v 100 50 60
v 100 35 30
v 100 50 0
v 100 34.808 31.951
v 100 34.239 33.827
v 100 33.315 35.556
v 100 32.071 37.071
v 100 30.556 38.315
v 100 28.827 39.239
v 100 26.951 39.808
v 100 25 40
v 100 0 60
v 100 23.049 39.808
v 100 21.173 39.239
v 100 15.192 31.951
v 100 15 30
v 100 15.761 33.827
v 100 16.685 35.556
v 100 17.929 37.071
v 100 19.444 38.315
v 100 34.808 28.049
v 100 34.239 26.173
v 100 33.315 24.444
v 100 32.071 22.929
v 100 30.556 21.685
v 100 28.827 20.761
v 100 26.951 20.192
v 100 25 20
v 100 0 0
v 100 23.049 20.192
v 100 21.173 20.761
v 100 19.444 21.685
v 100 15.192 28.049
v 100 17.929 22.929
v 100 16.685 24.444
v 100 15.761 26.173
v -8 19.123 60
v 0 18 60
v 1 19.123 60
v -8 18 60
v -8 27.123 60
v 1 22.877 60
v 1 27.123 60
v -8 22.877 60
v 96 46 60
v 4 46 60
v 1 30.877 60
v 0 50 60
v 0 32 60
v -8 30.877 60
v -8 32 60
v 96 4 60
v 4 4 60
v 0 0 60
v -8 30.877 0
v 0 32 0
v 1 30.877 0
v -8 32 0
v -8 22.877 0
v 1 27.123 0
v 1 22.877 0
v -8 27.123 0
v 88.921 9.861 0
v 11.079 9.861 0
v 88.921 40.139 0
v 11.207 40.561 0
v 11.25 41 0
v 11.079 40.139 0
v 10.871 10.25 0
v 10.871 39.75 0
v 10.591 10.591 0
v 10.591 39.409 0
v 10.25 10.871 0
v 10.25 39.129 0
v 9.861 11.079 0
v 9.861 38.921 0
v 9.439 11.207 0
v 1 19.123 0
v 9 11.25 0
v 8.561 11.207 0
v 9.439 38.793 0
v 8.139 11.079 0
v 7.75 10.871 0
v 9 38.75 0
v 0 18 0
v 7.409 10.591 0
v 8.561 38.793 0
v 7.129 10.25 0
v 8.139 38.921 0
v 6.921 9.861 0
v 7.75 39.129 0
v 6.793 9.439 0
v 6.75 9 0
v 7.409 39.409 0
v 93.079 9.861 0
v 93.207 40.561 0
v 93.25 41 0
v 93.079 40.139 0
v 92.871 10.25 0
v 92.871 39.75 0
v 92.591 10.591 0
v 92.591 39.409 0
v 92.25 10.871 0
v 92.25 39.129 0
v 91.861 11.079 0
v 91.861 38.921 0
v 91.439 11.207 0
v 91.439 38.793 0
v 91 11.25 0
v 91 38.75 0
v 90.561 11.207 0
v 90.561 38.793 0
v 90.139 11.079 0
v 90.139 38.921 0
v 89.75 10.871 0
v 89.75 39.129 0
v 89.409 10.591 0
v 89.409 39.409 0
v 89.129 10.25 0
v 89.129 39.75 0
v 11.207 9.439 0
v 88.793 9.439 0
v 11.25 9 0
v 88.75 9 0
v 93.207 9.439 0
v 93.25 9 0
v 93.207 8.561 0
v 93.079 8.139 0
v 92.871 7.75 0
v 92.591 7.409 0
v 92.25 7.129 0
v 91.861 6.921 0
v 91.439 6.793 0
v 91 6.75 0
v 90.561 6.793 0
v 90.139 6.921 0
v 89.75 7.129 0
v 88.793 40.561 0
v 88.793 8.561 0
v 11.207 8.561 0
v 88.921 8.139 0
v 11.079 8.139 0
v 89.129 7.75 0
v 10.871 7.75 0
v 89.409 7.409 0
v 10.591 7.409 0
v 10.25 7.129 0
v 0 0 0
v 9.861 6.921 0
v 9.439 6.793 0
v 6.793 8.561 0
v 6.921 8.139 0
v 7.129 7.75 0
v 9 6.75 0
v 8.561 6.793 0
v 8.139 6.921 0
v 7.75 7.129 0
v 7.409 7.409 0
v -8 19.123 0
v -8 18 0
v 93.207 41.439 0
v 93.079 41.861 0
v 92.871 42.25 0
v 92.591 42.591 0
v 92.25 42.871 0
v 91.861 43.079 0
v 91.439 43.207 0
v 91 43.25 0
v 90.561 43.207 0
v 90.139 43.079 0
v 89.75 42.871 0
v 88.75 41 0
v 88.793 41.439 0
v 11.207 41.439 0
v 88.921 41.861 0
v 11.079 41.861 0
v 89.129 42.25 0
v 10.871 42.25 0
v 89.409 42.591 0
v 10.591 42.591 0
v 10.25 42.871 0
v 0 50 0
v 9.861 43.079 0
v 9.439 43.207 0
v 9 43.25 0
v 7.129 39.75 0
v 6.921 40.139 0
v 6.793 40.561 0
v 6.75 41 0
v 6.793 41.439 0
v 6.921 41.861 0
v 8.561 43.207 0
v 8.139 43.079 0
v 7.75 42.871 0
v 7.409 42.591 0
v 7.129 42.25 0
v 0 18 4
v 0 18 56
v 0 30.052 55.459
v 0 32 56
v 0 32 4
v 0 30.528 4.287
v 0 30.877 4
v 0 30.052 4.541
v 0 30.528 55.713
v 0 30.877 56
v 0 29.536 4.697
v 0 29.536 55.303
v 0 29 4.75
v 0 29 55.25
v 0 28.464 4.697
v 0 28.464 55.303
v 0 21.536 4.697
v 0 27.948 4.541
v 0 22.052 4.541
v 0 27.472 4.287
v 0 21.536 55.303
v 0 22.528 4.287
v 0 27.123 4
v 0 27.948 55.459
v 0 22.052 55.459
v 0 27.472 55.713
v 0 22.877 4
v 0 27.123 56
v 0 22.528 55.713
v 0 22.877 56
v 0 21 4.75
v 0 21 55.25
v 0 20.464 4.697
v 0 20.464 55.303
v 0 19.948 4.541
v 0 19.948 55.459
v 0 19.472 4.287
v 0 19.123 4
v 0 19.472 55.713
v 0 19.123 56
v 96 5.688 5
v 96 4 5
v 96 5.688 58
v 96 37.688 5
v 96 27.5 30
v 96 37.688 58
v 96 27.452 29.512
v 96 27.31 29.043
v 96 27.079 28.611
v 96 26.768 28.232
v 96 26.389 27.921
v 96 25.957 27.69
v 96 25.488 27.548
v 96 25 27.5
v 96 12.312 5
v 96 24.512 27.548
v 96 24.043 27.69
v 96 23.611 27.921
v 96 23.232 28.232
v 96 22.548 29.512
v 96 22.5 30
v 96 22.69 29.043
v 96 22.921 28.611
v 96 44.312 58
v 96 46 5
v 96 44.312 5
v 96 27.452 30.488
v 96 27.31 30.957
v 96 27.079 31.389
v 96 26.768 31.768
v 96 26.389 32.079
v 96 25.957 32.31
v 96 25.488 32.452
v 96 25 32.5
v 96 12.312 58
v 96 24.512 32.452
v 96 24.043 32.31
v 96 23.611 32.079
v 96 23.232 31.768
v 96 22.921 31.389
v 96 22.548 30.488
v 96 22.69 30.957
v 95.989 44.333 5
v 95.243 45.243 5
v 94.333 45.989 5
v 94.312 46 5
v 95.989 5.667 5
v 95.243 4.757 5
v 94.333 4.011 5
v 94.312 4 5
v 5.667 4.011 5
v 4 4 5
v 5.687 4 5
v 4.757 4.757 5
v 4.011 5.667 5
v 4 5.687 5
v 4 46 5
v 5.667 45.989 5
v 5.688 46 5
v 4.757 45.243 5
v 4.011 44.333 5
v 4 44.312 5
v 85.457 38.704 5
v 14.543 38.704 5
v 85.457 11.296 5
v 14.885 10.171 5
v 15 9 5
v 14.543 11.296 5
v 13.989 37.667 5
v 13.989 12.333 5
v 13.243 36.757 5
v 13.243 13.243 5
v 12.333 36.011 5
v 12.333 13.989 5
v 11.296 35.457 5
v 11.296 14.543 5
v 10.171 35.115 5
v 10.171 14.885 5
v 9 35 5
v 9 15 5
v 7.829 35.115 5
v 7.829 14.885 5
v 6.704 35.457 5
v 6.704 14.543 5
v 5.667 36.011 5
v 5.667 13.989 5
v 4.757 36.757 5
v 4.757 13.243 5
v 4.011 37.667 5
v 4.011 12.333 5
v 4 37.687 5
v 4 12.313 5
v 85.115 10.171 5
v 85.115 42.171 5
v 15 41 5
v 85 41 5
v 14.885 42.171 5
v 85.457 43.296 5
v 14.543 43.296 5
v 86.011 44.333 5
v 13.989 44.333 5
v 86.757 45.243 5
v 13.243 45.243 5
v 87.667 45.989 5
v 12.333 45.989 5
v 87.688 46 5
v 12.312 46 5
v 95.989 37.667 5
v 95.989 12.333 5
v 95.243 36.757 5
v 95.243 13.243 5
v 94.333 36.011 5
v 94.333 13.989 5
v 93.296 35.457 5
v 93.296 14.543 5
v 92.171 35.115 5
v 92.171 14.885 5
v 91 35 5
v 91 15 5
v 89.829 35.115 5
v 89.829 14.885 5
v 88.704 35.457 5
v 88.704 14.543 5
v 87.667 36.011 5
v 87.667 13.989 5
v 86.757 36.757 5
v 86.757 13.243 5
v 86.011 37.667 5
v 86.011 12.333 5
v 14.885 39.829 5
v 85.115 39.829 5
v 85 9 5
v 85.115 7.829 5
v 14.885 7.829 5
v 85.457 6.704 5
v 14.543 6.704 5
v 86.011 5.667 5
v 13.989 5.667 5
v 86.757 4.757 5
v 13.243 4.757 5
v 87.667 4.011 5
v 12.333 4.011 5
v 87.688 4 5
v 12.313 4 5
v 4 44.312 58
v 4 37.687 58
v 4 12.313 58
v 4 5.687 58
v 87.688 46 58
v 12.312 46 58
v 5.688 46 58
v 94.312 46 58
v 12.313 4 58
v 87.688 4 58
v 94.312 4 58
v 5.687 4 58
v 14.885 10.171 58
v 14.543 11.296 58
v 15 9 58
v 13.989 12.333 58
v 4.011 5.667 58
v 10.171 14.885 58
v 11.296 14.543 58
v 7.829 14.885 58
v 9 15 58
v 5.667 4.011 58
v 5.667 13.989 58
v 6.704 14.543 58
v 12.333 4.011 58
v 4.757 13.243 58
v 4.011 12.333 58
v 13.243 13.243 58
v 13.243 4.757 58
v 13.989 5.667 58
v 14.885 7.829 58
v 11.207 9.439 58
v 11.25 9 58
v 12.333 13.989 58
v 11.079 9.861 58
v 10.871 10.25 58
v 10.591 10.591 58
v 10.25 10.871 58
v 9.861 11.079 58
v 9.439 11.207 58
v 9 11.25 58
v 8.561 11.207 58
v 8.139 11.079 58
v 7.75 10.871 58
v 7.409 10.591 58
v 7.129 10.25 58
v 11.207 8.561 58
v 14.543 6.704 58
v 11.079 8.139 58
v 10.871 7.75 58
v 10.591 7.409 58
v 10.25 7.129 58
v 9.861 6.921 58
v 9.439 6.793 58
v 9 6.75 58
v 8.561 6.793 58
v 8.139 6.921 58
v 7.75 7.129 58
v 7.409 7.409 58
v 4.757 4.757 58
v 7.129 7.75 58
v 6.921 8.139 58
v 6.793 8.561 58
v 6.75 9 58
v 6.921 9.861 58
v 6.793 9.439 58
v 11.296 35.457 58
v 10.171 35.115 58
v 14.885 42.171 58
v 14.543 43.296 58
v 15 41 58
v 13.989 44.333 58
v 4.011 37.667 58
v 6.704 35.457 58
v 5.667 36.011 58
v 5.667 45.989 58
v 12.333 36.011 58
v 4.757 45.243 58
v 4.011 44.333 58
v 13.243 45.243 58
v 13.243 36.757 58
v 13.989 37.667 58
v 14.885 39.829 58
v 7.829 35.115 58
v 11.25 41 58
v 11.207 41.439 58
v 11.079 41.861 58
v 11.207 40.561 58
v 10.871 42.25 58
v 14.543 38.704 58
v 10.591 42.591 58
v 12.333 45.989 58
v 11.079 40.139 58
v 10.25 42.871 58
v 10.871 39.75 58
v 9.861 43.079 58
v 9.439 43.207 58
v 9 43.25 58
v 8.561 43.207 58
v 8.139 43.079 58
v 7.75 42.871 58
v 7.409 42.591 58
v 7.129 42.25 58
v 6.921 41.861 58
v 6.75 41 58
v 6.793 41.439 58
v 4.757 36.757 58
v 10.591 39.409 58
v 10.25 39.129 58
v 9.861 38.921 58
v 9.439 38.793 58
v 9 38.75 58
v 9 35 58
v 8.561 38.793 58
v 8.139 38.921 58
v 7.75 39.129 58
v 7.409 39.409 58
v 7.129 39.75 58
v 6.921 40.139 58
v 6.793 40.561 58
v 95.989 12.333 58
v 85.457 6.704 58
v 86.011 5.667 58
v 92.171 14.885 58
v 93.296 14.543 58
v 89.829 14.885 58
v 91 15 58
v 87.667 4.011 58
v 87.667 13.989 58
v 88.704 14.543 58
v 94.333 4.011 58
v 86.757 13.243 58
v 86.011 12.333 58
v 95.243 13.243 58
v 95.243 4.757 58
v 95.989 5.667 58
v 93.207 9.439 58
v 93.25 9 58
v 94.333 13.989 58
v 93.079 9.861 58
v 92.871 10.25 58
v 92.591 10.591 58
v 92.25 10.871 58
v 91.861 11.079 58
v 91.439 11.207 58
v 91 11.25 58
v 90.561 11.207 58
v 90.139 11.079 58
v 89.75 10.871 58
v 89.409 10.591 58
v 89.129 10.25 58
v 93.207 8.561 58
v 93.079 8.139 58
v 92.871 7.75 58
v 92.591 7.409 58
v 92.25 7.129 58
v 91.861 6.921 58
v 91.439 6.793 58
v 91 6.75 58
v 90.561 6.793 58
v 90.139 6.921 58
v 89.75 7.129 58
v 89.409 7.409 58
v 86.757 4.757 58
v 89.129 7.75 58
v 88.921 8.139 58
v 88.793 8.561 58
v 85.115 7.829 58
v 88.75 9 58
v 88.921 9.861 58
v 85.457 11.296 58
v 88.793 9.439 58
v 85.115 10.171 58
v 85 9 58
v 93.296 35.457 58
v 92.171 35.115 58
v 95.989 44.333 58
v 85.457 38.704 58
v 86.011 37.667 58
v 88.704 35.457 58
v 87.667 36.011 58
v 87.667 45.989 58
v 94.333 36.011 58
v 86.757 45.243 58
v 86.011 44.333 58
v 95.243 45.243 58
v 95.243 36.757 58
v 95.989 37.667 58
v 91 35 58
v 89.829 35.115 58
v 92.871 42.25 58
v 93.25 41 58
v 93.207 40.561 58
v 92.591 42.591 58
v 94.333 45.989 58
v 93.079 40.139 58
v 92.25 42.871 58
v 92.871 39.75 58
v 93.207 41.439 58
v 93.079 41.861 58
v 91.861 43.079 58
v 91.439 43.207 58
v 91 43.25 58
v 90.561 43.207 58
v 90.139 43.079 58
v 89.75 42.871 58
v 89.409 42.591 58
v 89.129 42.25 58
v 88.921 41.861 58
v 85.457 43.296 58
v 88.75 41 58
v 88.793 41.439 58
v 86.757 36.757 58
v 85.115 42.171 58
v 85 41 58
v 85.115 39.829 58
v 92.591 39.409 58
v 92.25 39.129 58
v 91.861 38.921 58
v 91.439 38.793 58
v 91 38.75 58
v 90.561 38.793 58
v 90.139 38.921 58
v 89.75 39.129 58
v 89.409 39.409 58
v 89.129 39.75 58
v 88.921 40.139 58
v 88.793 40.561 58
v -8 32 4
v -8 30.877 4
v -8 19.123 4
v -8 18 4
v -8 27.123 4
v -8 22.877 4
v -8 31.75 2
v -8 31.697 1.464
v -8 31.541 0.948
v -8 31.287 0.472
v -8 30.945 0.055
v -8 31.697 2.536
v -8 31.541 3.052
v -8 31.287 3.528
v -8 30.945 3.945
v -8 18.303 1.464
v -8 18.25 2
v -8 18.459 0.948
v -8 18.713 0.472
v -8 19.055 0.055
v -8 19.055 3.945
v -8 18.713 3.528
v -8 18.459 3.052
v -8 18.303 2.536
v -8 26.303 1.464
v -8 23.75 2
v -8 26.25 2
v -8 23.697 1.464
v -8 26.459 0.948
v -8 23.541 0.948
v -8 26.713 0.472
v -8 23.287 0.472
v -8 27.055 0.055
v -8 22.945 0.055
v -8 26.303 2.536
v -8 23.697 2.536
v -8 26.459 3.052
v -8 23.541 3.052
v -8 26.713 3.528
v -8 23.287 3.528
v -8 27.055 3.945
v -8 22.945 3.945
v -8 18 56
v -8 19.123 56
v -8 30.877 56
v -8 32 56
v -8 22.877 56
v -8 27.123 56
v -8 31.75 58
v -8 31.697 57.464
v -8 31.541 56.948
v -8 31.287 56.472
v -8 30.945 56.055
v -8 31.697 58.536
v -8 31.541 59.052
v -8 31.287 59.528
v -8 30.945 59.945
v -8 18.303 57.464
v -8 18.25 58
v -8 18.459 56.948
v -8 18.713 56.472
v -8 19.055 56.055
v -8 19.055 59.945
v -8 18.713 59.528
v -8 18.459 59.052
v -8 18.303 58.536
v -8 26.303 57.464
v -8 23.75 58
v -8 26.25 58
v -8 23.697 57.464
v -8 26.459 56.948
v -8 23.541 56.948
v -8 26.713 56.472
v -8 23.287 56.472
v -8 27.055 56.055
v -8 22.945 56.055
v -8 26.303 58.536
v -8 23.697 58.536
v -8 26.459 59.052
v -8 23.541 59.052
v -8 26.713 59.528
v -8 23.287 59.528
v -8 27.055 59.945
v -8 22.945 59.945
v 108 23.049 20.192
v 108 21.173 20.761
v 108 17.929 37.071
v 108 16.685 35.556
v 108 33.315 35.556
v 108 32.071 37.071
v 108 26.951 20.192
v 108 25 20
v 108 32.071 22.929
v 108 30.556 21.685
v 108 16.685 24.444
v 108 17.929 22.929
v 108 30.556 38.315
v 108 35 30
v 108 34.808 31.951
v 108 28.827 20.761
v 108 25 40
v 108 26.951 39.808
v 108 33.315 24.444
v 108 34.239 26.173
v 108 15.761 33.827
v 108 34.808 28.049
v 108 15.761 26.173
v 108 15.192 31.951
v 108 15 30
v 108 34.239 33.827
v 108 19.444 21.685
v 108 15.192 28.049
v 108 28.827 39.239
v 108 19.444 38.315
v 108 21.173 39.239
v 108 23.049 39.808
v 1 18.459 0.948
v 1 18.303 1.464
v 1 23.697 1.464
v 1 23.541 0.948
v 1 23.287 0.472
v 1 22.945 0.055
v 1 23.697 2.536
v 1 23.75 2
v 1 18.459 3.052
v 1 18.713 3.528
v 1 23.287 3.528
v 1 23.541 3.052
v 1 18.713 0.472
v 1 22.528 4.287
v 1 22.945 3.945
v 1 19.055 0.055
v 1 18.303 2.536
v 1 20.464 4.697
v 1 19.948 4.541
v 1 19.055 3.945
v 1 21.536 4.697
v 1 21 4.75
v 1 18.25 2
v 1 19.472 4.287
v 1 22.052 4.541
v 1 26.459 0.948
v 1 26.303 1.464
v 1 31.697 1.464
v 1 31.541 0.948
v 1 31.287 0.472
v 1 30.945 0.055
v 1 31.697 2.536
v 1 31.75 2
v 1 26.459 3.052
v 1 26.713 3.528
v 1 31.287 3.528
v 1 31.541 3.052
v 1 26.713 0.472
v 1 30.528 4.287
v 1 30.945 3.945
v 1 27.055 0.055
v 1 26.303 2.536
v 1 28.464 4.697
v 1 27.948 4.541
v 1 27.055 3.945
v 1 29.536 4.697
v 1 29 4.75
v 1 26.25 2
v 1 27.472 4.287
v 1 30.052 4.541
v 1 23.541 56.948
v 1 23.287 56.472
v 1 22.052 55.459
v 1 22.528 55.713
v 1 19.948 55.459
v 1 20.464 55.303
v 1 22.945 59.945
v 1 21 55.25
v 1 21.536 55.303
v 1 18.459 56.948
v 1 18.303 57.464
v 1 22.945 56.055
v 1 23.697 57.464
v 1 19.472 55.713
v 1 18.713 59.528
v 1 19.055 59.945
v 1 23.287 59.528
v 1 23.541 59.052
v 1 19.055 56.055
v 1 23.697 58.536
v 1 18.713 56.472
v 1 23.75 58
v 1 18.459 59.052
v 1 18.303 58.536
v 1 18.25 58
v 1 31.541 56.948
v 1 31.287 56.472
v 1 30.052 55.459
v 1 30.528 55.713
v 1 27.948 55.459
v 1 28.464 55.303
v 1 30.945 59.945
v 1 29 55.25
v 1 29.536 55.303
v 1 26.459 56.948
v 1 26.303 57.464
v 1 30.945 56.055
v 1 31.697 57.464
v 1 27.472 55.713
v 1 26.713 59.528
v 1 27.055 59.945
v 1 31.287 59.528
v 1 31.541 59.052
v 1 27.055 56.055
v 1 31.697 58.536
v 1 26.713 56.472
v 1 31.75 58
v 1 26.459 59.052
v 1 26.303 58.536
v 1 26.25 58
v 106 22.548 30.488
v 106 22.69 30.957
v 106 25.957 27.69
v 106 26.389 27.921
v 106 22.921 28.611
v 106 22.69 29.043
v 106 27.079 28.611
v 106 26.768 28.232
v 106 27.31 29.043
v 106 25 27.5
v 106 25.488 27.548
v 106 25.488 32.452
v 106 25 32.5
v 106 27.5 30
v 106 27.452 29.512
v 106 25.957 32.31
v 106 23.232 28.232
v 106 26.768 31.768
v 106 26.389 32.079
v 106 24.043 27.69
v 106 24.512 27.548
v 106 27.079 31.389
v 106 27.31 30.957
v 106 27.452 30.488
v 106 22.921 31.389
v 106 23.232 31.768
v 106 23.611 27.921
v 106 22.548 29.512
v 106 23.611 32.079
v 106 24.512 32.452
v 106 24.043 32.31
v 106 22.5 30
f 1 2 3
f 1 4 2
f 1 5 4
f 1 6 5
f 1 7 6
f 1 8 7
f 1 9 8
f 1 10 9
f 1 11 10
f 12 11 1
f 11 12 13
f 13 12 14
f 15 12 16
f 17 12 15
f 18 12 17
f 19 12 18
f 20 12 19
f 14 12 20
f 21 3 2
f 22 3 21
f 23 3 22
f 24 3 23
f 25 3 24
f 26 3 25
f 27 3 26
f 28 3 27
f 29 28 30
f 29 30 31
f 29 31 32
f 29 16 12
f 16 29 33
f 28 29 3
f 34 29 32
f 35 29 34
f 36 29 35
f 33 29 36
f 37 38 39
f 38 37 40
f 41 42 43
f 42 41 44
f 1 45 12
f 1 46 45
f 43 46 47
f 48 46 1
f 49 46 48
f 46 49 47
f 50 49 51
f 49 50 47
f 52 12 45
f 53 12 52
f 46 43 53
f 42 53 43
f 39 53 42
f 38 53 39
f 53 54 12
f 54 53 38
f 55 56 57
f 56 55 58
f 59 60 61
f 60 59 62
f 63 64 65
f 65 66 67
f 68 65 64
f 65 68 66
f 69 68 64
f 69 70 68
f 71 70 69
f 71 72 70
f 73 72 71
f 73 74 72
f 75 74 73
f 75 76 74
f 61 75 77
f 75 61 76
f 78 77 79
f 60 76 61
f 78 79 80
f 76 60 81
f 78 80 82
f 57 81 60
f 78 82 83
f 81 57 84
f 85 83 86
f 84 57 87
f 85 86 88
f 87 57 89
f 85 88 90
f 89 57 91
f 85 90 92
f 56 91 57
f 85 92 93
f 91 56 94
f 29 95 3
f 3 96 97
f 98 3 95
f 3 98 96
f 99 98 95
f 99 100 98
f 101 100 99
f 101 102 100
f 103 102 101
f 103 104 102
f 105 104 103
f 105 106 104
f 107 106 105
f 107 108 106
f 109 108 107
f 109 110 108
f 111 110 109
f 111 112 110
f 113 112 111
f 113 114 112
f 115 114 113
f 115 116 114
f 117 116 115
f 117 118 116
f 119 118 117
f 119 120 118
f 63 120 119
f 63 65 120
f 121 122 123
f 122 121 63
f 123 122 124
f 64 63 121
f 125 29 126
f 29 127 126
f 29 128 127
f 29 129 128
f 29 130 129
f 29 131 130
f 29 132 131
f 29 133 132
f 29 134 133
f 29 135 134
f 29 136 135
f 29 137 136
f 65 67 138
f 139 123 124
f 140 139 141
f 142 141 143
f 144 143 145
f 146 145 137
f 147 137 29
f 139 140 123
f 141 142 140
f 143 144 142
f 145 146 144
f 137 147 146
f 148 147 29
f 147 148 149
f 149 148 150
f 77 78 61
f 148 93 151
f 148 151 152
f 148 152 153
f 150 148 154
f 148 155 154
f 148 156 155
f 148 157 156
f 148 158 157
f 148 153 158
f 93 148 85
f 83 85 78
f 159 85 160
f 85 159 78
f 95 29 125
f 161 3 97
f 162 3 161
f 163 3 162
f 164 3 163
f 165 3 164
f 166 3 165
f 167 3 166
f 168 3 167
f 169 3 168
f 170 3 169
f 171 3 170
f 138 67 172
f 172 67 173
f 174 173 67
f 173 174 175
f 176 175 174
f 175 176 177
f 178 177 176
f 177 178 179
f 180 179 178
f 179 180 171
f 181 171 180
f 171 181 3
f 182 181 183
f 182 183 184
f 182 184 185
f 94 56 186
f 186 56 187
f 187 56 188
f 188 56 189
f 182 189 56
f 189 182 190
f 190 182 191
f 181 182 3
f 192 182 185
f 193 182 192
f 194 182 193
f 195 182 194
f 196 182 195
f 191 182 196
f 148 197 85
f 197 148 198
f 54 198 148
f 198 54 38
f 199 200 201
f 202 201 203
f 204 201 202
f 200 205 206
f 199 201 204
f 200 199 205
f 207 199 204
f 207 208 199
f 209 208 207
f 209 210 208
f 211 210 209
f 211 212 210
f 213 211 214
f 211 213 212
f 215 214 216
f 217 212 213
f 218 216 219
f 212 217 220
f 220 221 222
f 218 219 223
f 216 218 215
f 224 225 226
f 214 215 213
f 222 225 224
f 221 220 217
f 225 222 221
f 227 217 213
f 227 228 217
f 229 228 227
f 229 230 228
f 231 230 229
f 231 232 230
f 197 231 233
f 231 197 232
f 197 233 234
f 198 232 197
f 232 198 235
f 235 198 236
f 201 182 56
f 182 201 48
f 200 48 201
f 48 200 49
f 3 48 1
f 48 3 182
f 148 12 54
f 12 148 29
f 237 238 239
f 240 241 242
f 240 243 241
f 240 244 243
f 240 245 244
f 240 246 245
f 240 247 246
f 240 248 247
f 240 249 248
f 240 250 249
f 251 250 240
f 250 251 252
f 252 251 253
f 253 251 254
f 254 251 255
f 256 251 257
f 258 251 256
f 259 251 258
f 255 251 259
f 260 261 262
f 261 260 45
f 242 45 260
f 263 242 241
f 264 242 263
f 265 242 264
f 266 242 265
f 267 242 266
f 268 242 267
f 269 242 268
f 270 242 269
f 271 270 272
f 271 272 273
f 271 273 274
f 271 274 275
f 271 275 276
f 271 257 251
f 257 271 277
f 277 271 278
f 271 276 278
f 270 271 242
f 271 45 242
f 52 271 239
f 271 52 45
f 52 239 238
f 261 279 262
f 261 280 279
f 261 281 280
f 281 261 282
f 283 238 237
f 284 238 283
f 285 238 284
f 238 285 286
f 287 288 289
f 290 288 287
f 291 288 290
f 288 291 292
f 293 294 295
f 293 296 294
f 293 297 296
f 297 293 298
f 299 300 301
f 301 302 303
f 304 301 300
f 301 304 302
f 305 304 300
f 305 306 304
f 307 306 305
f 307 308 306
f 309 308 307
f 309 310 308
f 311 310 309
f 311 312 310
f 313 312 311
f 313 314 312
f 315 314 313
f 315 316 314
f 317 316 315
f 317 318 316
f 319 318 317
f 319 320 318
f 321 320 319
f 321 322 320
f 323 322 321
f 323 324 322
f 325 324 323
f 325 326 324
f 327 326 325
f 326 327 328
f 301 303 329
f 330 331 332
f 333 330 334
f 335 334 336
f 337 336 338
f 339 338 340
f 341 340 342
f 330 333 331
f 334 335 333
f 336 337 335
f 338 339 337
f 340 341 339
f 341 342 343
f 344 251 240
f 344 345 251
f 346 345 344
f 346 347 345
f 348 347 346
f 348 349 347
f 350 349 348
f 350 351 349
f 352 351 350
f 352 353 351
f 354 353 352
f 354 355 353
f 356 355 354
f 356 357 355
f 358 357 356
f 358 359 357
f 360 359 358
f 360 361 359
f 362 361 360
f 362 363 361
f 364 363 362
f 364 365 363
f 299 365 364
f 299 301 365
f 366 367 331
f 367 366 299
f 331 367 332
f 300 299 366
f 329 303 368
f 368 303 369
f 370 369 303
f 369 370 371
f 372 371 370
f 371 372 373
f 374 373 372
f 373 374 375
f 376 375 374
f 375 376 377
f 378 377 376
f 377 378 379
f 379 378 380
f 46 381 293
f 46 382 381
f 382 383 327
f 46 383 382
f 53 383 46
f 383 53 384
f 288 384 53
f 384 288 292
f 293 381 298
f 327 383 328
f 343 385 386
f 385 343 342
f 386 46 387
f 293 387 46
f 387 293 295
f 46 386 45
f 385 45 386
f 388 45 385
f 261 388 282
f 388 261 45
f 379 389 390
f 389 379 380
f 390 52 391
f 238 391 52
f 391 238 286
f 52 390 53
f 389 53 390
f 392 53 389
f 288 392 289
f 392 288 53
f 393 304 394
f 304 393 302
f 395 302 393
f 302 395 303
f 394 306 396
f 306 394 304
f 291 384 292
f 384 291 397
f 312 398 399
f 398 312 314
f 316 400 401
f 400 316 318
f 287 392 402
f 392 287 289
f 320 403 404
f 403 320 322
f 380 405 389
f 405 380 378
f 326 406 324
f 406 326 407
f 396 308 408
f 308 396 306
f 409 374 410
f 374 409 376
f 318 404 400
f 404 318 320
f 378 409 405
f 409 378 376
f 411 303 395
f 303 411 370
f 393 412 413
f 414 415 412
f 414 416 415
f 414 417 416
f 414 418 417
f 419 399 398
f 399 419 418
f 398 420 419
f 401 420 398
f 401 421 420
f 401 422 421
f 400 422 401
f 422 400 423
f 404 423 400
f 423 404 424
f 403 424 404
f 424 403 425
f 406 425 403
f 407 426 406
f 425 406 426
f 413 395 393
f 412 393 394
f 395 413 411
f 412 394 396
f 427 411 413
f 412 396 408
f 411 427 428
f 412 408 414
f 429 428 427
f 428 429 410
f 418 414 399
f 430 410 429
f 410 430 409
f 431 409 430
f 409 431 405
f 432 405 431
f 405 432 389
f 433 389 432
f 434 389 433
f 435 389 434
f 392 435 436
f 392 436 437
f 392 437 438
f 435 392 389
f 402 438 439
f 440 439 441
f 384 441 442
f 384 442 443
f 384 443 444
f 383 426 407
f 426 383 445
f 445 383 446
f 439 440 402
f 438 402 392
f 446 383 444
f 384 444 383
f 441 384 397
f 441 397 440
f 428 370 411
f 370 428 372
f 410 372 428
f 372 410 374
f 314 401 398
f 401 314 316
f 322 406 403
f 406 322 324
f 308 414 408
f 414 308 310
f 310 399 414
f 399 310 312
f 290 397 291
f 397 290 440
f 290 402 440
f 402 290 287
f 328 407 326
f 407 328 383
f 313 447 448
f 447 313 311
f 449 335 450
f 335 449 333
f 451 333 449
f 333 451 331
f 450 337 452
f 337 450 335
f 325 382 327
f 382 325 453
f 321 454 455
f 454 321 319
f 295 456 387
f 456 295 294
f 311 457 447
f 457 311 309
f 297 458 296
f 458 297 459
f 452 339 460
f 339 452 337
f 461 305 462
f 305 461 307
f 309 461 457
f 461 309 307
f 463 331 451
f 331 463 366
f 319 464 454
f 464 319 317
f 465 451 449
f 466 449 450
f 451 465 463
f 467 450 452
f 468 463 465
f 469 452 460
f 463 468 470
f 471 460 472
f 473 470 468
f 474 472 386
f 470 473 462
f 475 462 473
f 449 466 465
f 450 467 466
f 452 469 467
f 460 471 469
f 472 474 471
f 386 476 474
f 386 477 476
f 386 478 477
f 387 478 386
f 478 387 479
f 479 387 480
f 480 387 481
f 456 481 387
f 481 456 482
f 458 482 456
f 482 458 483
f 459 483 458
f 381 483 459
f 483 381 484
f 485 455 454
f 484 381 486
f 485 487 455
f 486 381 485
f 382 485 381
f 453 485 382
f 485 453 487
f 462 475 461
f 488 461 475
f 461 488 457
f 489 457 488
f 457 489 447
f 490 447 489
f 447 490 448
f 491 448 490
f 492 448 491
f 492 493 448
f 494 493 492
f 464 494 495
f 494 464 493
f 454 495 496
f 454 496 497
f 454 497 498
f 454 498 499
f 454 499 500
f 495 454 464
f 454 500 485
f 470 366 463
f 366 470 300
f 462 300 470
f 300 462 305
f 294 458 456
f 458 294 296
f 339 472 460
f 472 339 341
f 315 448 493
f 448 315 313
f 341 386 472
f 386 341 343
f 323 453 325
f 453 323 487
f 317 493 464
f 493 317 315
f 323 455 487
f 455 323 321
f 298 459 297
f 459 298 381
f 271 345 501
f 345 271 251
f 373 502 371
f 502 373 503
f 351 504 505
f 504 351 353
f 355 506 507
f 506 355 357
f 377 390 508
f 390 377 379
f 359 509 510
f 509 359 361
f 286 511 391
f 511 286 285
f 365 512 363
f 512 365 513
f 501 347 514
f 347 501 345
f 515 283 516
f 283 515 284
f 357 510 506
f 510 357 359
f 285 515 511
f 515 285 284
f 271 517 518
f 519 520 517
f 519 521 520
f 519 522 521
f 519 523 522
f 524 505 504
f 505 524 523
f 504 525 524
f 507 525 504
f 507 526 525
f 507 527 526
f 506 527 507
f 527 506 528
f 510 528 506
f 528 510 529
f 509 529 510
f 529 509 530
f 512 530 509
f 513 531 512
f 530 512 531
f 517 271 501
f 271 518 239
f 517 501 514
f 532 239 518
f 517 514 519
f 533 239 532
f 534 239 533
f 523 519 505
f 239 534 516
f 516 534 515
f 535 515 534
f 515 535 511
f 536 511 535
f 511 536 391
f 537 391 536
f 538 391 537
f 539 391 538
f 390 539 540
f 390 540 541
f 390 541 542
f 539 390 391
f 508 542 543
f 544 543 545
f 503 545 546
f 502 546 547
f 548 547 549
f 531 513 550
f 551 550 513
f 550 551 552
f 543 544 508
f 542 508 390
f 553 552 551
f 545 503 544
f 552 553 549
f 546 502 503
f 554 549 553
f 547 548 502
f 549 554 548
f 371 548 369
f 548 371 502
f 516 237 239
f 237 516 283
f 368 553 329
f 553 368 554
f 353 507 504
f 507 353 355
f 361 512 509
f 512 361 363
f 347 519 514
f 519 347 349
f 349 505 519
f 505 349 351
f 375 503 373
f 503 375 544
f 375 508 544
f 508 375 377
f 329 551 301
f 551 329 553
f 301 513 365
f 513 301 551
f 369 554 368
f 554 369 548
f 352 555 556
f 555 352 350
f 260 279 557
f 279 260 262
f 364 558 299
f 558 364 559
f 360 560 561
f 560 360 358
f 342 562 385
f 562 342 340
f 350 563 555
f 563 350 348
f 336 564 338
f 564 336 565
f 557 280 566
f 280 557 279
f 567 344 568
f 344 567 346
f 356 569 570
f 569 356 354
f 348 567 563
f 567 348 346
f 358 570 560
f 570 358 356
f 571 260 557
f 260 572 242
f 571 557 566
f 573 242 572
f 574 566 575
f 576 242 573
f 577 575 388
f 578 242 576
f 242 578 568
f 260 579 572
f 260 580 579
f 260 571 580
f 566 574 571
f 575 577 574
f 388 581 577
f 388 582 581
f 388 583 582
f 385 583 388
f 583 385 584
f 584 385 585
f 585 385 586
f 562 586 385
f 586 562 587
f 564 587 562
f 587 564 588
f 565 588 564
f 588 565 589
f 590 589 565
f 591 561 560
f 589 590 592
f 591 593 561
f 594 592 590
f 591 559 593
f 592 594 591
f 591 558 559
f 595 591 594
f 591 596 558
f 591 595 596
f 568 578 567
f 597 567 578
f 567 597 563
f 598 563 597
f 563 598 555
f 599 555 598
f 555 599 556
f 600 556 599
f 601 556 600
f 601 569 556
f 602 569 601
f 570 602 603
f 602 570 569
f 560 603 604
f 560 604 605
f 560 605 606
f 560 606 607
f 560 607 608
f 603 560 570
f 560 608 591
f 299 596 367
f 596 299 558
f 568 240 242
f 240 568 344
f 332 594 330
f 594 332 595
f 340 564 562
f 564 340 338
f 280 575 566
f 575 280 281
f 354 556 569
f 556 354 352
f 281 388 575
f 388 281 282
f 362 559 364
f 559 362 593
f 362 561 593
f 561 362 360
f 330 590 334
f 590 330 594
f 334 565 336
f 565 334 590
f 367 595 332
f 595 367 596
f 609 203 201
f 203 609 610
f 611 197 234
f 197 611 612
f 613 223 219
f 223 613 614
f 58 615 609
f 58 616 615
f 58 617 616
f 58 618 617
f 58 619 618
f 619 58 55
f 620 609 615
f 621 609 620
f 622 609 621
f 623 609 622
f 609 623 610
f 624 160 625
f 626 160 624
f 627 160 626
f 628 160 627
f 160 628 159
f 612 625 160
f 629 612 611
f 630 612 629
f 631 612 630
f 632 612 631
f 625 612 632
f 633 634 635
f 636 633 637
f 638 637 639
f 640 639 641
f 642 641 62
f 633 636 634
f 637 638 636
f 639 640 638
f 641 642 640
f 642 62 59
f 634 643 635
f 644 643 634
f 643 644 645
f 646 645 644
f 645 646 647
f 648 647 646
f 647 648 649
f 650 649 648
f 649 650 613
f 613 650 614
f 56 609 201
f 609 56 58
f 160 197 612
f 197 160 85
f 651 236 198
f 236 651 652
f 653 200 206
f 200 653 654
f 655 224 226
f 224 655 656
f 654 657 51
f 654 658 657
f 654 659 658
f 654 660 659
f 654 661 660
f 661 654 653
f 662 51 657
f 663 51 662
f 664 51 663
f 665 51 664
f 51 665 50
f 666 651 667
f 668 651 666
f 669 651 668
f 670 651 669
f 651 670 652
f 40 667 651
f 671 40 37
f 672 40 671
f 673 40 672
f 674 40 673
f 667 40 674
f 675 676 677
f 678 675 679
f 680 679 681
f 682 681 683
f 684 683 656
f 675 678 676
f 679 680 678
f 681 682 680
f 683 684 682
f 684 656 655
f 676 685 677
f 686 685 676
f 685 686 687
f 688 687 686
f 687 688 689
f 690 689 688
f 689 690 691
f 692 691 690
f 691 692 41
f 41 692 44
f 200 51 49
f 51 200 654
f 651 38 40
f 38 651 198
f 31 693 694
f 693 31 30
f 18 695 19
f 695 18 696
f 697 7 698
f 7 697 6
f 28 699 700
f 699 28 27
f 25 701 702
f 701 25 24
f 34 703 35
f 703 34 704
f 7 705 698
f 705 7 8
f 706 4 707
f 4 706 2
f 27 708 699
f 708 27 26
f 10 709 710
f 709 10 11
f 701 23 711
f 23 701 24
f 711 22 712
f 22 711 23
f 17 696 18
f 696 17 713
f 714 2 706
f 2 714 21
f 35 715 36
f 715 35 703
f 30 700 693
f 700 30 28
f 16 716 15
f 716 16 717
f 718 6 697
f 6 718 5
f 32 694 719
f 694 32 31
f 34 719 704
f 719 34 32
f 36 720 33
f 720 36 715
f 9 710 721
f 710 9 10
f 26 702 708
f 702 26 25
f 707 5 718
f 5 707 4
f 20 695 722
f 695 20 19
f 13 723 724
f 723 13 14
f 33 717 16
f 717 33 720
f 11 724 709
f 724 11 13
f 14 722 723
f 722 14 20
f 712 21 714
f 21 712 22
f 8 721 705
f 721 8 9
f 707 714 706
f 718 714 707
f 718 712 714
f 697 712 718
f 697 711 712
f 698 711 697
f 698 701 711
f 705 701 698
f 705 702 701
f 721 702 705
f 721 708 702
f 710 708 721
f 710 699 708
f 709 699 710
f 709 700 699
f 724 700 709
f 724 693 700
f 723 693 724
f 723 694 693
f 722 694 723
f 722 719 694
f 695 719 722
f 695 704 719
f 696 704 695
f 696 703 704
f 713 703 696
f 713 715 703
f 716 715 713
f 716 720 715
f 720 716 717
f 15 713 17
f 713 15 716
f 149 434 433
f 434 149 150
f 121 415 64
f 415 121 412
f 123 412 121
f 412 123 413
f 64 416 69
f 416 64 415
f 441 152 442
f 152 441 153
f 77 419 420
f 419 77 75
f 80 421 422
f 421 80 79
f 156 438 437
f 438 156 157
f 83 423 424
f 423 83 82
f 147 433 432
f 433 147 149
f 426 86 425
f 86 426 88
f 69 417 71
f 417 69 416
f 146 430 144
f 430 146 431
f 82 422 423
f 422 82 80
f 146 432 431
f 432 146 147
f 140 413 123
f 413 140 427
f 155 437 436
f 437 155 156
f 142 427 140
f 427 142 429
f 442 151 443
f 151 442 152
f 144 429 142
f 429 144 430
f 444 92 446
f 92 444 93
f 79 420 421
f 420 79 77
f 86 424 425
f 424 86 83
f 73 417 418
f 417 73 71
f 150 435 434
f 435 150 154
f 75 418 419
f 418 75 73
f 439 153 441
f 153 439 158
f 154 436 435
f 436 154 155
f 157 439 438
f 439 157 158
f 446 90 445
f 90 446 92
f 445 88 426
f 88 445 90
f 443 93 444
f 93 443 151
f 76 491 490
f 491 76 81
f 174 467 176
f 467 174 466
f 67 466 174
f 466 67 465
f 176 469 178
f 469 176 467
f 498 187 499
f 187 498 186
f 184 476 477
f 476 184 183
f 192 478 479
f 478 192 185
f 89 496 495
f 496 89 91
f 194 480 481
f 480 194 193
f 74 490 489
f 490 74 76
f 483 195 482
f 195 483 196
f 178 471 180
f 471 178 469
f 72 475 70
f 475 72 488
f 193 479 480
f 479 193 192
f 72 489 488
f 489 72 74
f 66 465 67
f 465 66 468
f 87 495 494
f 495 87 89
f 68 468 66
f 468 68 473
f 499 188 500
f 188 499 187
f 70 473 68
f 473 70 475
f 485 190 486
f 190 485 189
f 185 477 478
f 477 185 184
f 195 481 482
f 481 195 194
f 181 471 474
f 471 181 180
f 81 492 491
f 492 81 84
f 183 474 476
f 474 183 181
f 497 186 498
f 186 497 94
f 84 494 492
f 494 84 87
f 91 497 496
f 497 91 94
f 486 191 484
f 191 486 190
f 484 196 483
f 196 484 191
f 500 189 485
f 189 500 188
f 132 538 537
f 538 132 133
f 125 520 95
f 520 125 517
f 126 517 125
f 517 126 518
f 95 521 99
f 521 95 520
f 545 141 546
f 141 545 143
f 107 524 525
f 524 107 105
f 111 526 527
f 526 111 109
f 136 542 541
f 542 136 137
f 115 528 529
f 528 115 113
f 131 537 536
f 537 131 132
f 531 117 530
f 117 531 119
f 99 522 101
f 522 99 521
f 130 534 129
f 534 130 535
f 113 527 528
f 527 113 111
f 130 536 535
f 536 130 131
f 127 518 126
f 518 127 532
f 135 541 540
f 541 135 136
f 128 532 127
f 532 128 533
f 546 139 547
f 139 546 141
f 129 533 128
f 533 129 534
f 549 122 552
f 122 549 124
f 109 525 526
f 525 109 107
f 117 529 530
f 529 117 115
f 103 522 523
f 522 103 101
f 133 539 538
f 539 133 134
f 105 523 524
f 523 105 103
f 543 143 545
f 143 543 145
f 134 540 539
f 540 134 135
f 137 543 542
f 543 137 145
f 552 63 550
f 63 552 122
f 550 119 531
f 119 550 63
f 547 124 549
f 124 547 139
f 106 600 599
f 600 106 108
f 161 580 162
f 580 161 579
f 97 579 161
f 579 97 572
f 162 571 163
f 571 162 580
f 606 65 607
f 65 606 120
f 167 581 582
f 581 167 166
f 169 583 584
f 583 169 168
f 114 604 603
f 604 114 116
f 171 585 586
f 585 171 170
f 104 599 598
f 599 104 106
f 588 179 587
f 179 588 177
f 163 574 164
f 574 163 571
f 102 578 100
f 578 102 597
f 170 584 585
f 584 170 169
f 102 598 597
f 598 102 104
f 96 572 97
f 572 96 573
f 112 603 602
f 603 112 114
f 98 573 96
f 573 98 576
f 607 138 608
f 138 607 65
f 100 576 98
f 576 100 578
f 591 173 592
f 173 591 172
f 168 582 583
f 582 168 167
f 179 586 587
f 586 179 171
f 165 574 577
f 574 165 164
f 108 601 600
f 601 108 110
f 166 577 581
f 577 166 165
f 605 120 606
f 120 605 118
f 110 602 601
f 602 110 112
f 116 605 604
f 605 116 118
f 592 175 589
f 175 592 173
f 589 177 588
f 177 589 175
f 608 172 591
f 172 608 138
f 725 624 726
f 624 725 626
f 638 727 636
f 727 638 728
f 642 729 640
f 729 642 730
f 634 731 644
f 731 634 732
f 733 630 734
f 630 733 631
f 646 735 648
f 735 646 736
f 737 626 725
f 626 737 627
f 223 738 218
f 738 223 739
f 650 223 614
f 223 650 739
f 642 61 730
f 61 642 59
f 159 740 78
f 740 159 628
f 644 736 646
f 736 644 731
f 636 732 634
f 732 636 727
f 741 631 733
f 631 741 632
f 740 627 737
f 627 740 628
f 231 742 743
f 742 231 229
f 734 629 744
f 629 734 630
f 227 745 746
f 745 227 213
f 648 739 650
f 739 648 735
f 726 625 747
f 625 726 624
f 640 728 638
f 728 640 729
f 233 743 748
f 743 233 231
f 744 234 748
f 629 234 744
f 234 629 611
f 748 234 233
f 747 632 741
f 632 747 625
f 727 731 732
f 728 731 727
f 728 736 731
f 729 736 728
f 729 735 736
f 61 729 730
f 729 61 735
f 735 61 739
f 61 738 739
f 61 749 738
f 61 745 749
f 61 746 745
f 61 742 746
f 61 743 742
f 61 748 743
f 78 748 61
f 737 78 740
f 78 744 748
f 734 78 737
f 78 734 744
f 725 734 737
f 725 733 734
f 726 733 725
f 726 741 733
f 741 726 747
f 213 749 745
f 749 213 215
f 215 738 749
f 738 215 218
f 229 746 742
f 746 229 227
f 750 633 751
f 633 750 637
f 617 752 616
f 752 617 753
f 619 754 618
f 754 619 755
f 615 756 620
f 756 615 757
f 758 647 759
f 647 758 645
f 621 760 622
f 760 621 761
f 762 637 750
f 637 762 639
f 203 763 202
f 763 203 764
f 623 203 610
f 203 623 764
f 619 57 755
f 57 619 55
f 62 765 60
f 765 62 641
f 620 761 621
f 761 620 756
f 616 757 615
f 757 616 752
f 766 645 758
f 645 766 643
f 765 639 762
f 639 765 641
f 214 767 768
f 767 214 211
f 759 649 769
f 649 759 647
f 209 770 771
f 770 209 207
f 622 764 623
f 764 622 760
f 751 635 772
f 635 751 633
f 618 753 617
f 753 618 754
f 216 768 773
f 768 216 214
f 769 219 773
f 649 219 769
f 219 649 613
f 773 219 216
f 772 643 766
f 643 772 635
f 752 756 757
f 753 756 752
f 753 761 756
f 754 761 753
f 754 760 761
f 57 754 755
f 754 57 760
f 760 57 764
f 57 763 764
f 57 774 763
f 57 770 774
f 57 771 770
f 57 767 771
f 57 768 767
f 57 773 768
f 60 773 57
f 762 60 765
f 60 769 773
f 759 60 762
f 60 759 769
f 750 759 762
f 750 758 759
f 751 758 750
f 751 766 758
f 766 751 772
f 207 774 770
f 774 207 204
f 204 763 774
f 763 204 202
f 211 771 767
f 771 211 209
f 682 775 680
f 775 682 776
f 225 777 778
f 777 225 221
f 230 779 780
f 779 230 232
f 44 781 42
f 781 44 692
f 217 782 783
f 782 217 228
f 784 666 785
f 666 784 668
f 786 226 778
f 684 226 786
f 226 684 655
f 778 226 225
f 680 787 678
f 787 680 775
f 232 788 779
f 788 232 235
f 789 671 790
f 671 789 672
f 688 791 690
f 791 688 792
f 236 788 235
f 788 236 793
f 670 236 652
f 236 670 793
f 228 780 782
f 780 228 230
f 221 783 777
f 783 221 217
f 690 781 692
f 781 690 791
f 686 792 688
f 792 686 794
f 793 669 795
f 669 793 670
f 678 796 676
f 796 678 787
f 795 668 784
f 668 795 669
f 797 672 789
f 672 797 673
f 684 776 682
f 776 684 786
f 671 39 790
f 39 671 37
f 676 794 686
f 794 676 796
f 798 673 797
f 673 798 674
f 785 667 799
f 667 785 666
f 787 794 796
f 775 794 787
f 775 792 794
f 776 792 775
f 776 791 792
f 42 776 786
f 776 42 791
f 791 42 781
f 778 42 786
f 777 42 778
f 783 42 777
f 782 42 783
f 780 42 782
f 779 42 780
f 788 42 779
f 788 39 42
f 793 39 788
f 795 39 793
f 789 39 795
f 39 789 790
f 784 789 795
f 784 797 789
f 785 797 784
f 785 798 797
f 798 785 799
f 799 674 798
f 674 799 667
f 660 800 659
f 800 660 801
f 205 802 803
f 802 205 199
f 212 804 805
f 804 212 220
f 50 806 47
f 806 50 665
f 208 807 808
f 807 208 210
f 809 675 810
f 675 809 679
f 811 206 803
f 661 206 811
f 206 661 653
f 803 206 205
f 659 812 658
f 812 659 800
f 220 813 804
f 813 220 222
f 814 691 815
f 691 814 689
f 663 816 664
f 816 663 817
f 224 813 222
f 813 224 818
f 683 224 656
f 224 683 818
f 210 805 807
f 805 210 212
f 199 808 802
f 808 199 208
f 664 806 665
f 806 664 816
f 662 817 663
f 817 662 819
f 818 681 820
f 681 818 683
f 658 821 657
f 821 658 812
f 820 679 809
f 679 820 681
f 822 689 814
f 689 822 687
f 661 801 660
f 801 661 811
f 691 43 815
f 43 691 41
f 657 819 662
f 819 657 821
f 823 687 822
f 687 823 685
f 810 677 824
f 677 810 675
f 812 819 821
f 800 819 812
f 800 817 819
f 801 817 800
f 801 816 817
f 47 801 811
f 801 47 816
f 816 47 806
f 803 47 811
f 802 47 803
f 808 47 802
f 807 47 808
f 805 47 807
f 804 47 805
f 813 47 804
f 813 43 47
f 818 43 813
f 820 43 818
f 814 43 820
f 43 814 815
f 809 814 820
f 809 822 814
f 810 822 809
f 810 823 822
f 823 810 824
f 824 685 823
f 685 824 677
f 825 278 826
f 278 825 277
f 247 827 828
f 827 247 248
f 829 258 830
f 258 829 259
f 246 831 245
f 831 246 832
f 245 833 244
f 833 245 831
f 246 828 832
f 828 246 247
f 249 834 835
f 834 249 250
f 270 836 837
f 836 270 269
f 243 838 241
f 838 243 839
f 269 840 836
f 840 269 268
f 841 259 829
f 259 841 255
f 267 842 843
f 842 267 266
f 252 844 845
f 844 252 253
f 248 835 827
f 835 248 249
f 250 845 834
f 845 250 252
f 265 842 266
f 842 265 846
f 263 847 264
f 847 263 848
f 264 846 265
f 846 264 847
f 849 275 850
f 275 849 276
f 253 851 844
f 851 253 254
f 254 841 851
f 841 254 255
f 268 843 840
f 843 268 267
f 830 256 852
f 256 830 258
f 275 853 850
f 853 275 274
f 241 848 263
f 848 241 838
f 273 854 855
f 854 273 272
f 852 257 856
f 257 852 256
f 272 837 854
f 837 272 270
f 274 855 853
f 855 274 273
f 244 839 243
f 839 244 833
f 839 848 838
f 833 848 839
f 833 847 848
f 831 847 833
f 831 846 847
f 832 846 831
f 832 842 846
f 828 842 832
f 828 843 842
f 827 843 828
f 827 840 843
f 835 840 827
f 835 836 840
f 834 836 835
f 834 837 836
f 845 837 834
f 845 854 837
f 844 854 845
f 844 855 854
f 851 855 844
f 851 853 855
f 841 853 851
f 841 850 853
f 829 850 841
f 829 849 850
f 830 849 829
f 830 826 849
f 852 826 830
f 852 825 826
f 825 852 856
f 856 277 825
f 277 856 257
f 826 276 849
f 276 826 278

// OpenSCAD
$fn = 32;

// ----------------------------------------------------------------------
// Enclosure body: 100 x 50 x 60 mm, wall 4 mm
// ----------------------------------------------------------------------

// --- parameters (mm) ---
length = 100;             // outside length, X
width = 50;               // outside width, Y
height = 60;              // outside height, Z
wall = 4;                 // side wall thickness
floor_t = 5;              // floor thickness
boss_d = 12;              // corner boss diameter
boss_h = 53;              // corner boss height above the floor
boss_hole_d = 4.5;        // lid screw clearance in the boss
boss_lip = 9;             // boss centre inset from the corner
ear_w = 14;               // mounting ear width
ear_t = 4;                // mounting ear thickness
ear_ext = 8;              // mounting ear reach
ear_hole_d = 5.5;         // mounting ear drills
nipple_d = 20;            // cable gland boss diameter
nipple_h = 8;             // cable gland boss height
nipple_bore = 5;          // cable gland bore

module shell() {
  difference() {
    cube([length, width, height]);
    /* hollow, open at the top */
    translate([wall, wall, floor_t])
      cube([length - 2 * wall, width - 2 * wall, height]);
  }
}

module bosses() {
  /* corner bosses, sunk 1 mm into the floor */
  for (sx = [0, 1]) for (sy = [0, 1])
    translate([sx * (length - 2 * boss_lip) + boss_lip, sy * (width - 2 * boss_lip) + boss_lip, floor_t - 1])
      cylinder(h = boss_h + 1, d = boss_d);
}

module gland() {
  /* boss on the short wall, sunk 1 mm into it */
  translate([length - 1, width / 2, height * 0.5]) rotate([0, 90, 0])
    cylinder(h = nipple_h + 1, d = nipple_d);
}

module ears() {
  /* mounting ears on the short walls, sunk into the wall */
  for (sz = [0, 1])
    translate([-ear_ext, width / 2 - ear_w / 2, sz * (height - ear_t)])
      cube([ear_ext + 2.5, ear_w, ear_t]);
}

difference() {
  union() {
    shell();
    bosses();
    gland();
    ears();
  }
  /* boss screw holes */
  for (sx = [0, 1]) for (sy = [0, 1])
    translate([sx * (length - 2 * boss_lip) + boss_lip, sy * (width - 2 * boss_lip) + boss_lip, -1]) cylinder(h = floor_t + boss_h + 2, d = boss_hole_d);
  translate([length, width / 2, height * 0.5]) rotate([0, 90, 0]) translate([0, 0, -nipple_h - 2]) cylinder(h = nipple_h + wall + 4, d = nipple_bore);
  for (sz = [0, 1]) for (sx = [0, 1]) translate([-ear_ext - 1, width / 2 + (2 * sx - 1) * (ear_w / 2 - 3), sz * (height - ear_t) + ear_t / 2]) rotate([0, 90, 0]) cylinder(h = ear_ext + 2, d = ear_hole_d);
}
